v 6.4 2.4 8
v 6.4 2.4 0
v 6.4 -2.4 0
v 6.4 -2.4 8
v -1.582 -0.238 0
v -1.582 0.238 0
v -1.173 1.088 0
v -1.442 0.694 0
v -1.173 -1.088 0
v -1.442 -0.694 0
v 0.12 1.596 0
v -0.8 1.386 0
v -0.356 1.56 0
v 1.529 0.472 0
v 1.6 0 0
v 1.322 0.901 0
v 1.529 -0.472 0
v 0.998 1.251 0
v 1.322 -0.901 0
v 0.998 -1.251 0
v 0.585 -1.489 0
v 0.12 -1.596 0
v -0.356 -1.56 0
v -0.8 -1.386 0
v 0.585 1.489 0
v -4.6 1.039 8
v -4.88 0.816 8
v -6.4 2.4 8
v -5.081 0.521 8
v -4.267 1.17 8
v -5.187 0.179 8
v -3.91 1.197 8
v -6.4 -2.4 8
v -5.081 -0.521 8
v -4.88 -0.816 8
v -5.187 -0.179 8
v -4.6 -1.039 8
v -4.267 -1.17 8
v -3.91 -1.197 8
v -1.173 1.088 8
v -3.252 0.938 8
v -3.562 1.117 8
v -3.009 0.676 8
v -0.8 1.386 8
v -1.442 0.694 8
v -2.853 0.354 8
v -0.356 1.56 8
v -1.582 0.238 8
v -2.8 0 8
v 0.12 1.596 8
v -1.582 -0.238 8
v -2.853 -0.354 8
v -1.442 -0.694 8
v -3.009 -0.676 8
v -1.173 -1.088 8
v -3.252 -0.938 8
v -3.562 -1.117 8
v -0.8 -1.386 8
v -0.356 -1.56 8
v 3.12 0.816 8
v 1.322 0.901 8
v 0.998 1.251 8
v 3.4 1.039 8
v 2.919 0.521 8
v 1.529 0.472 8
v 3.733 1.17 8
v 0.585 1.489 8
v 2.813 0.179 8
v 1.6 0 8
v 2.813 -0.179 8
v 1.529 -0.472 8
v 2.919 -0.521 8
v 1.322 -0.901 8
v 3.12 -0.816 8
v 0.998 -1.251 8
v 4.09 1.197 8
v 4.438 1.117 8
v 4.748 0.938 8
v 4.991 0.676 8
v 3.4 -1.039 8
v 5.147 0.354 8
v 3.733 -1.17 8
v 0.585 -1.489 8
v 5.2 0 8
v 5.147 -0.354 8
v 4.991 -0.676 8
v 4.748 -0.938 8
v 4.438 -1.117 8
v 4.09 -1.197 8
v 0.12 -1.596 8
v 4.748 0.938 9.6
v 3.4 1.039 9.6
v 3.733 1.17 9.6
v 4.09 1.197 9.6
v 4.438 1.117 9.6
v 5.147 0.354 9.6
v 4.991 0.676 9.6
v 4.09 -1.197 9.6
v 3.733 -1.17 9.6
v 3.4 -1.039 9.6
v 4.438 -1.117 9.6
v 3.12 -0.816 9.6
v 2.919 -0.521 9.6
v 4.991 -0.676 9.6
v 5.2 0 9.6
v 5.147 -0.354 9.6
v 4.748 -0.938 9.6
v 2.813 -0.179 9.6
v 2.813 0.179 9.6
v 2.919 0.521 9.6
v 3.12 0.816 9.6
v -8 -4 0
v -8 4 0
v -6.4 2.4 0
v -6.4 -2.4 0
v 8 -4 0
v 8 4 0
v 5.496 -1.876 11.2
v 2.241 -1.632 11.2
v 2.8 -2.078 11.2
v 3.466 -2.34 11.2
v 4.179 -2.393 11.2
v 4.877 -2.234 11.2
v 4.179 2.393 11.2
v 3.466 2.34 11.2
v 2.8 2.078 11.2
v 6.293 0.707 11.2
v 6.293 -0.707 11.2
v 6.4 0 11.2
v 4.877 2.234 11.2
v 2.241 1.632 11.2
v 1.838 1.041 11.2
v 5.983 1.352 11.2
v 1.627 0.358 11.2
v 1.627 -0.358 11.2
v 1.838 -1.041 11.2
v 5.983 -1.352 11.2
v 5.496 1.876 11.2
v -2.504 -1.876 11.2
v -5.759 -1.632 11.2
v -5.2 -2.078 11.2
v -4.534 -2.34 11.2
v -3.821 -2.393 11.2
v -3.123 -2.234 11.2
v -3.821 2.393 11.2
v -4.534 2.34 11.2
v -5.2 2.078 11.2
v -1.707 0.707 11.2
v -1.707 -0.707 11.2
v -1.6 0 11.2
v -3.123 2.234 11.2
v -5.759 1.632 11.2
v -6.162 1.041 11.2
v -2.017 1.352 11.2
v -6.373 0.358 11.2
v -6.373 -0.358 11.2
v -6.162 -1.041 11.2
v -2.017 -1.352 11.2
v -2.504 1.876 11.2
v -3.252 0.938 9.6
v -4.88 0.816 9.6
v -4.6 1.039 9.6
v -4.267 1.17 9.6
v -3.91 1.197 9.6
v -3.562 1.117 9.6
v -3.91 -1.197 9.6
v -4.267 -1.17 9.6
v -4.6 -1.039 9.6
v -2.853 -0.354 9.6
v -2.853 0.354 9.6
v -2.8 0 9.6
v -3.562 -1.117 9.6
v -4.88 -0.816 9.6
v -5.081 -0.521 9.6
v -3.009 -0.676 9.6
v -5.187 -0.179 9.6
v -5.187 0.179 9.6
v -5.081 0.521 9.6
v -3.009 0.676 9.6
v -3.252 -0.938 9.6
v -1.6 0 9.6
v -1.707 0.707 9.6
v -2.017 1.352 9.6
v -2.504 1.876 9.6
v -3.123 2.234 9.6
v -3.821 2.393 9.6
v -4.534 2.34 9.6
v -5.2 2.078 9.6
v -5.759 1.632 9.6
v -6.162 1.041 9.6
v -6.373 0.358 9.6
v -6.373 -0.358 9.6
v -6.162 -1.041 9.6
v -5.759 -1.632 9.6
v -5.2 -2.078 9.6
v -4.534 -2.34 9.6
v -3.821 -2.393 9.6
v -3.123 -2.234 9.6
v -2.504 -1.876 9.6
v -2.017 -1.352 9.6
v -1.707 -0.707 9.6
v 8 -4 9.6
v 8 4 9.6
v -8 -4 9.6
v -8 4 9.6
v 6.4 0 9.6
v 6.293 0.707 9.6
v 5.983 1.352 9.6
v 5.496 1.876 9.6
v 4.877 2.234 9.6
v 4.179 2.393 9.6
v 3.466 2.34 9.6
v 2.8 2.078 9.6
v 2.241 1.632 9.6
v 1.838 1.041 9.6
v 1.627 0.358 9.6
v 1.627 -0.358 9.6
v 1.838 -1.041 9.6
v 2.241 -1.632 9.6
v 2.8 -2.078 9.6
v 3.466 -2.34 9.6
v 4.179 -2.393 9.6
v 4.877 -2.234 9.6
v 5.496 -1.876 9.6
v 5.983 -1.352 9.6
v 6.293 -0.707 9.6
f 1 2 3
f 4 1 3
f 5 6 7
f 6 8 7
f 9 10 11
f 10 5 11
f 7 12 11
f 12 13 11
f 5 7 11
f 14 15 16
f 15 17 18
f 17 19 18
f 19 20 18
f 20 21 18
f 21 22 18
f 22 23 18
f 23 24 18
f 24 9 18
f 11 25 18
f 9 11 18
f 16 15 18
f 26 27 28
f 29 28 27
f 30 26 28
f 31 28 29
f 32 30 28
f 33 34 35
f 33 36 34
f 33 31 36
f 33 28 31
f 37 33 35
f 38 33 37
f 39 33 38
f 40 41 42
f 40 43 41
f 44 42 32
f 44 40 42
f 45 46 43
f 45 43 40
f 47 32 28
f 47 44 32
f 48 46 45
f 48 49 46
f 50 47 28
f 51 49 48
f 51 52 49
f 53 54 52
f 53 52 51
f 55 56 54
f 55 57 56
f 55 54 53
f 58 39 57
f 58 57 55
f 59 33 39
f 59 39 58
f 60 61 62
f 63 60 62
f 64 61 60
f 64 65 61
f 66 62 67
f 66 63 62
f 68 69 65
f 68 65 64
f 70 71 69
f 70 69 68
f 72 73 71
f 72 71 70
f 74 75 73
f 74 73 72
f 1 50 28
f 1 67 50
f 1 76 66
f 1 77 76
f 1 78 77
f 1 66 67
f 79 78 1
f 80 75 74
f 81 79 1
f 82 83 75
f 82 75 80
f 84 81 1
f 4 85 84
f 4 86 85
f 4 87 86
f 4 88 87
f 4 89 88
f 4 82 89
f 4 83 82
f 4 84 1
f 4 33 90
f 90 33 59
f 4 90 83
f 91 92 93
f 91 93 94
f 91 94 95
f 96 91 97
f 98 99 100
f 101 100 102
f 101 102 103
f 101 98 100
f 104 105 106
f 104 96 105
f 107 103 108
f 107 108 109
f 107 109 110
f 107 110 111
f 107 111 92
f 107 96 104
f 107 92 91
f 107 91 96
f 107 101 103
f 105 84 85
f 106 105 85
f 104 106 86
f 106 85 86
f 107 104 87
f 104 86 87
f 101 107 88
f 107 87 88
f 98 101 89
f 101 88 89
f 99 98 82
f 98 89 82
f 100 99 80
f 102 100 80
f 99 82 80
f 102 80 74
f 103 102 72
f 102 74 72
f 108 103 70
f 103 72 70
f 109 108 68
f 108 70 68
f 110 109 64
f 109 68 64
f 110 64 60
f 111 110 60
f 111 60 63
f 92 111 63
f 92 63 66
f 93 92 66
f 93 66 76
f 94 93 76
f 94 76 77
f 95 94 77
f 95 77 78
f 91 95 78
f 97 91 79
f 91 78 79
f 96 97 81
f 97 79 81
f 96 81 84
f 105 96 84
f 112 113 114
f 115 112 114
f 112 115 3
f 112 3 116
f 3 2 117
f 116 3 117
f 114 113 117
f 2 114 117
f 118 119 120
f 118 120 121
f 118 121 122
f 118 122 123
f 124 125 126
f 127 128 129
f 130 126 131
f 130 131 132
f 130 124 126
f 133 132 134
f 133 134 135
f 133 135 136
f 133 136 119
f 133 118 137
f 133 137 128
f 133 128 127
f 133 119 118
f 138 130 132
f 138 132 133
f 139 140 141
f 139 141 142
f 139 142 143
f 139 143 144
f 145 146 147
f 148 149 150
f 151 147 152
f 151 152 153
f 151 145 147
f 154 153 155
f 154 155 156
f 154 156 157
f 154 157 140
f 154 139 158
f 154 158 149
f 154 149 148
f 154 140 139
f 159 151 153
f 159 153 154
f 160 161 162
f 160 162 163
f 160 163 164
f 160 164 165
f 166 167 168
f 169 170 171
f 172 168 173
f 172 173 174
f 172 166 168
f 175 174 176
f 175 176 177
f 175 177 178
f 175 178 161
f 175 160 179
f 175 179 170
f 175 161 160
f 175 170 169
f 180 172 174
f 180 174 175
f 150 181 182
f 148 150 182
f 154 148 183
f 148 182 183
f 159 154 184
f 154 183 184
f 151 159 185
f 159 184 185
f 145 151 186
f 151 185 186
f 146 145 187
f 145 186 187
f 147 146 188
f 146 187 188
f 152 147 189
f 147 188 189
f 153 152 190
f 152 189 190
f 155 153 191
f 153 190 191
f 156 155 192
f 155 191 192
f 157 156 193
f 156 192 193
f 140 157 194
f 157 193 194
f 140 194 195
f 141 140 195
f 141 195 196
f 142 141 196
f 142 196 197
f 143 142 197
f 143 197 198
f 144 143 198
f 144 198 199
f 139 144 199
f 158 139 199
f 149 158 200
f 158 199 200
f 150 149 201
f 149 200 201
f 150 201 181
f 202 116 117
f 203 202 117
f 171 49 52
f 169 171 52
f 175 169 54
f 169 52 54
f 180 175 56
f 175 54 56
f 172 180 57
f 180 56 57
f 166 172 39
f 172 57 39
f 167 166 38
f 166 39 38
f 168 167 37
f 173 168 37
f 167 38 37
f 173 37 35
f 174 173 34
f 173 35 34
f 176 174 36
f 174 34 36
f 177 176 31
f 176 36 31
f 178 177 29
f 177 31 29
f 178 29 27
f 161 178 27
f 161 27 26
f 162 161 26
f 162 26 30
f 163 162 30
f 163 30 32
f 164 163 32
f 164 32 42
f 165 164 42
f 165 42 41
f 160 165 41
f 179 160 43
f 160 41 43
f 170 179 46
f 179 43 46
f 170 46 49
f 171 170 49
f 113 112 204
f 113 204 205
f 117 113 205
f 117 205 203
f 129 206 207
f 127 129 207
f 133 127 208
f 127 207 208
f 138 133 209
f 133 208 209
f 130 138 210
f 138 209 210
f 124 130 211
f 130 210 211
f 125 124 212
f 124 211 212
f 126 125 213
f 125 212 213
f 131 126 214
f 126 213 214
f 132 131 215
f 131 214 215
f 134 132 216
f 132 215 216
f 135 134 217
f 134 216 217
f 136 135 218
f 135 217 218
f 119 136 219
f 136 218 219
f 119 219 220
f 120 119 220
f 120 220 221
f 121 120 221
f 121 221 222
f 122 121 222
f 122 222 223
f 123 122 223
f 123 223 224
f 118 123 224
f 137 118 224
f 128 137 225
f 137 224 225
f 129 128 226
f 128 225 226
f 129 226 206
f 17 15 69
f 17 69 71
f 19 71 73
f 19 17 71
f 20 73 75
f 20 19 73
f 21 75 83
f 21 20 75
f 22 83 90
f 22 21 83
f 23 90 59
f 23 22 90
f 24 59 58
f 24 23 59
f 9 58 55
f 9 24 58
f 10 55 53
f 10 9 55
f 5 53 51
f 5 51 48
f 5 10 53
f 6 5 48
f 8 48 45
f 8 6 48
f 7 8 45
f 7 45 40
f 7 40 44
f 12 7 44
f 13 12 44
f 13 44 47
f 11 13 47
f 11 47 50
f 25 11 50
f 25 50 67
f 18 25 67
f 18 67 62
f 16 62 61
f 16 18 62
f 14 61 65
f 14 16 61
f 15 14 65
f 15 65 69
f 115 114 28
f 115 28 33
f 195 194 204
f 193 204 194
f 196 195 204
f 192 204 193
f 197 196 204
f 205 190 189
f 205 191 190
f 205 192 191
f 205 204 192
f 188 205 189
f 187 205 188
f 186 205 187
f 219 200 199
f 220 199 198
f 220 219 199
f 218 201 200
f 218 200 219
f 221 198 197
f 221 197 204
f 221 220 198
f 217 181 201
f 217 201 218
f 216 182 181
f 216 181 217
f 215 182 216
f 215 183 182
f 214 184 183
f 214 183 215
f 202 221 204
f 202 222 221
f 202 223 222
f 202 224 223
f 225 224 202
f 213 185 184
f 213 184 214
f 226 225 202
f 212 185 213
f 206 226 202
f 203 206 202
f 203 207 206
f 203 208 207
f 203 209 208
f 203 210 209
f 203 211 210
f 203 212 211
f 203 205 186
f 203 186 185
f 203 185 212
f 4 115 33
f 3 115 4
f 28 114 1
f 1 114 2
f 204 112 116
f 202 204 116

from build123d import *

# Parameters (mm, degrees)
F0_W     = 16
F0_H     = 8
F1_DEPTH = 9.6
F2_W     = 12.8
F2_H     = 4.8
F2_R     = 1.6
F3_DEPTH = 8
F4_R     = 2.4
F5_DEPTH = 1.6
F6_R     = 1.2
F7_DEPTH = 1.6


with BuildPart() as f1:
    # F0 (on Top) → F1 (new body)
    with BuildSketch(Plane.XY):
        Rectangle(F0_W, F0_H)
    extrude(amount=F1_DEPTH)

    # F2 (on face) → F3 (cut)
    with BuildSketch(Plane(origin=(0, 0, 0), x_dir=(1, 0, 0), z_dir=(0, 0, -1))):
        Rectangle(F2_W, F2_H)
        Circle(F2_R, mode=Mode.SUBTRACT)
    extrude(amount=-F3_DEPTH, mode=Mode.SUBTRACT)

    # F4 (on face) → F5 (join)
    with BuildSketch(Plane.XY.offset(9.6)):
        with Locations((-4, 0)):
            Circle(F4_R)
        with Locations((4, 0)):
            Circle(F4_R)
    extrude(amount=F5_DEPTH)

    # F6 (on face) → F7 (cut)
    with BuildSketch(Plane(origin=(0, 0, 8), x_dir=(1, 0, 0), z_dir=(0, 0, -1))):
        with Locations((4, 0)):
            Circle(F6_R)
        with Locations((-4, 0)):
            Circle(F6_R)
    extrude(amount=-F7_DEPTH, mode=Mode.SUBTRACT)


solid = f1.part
